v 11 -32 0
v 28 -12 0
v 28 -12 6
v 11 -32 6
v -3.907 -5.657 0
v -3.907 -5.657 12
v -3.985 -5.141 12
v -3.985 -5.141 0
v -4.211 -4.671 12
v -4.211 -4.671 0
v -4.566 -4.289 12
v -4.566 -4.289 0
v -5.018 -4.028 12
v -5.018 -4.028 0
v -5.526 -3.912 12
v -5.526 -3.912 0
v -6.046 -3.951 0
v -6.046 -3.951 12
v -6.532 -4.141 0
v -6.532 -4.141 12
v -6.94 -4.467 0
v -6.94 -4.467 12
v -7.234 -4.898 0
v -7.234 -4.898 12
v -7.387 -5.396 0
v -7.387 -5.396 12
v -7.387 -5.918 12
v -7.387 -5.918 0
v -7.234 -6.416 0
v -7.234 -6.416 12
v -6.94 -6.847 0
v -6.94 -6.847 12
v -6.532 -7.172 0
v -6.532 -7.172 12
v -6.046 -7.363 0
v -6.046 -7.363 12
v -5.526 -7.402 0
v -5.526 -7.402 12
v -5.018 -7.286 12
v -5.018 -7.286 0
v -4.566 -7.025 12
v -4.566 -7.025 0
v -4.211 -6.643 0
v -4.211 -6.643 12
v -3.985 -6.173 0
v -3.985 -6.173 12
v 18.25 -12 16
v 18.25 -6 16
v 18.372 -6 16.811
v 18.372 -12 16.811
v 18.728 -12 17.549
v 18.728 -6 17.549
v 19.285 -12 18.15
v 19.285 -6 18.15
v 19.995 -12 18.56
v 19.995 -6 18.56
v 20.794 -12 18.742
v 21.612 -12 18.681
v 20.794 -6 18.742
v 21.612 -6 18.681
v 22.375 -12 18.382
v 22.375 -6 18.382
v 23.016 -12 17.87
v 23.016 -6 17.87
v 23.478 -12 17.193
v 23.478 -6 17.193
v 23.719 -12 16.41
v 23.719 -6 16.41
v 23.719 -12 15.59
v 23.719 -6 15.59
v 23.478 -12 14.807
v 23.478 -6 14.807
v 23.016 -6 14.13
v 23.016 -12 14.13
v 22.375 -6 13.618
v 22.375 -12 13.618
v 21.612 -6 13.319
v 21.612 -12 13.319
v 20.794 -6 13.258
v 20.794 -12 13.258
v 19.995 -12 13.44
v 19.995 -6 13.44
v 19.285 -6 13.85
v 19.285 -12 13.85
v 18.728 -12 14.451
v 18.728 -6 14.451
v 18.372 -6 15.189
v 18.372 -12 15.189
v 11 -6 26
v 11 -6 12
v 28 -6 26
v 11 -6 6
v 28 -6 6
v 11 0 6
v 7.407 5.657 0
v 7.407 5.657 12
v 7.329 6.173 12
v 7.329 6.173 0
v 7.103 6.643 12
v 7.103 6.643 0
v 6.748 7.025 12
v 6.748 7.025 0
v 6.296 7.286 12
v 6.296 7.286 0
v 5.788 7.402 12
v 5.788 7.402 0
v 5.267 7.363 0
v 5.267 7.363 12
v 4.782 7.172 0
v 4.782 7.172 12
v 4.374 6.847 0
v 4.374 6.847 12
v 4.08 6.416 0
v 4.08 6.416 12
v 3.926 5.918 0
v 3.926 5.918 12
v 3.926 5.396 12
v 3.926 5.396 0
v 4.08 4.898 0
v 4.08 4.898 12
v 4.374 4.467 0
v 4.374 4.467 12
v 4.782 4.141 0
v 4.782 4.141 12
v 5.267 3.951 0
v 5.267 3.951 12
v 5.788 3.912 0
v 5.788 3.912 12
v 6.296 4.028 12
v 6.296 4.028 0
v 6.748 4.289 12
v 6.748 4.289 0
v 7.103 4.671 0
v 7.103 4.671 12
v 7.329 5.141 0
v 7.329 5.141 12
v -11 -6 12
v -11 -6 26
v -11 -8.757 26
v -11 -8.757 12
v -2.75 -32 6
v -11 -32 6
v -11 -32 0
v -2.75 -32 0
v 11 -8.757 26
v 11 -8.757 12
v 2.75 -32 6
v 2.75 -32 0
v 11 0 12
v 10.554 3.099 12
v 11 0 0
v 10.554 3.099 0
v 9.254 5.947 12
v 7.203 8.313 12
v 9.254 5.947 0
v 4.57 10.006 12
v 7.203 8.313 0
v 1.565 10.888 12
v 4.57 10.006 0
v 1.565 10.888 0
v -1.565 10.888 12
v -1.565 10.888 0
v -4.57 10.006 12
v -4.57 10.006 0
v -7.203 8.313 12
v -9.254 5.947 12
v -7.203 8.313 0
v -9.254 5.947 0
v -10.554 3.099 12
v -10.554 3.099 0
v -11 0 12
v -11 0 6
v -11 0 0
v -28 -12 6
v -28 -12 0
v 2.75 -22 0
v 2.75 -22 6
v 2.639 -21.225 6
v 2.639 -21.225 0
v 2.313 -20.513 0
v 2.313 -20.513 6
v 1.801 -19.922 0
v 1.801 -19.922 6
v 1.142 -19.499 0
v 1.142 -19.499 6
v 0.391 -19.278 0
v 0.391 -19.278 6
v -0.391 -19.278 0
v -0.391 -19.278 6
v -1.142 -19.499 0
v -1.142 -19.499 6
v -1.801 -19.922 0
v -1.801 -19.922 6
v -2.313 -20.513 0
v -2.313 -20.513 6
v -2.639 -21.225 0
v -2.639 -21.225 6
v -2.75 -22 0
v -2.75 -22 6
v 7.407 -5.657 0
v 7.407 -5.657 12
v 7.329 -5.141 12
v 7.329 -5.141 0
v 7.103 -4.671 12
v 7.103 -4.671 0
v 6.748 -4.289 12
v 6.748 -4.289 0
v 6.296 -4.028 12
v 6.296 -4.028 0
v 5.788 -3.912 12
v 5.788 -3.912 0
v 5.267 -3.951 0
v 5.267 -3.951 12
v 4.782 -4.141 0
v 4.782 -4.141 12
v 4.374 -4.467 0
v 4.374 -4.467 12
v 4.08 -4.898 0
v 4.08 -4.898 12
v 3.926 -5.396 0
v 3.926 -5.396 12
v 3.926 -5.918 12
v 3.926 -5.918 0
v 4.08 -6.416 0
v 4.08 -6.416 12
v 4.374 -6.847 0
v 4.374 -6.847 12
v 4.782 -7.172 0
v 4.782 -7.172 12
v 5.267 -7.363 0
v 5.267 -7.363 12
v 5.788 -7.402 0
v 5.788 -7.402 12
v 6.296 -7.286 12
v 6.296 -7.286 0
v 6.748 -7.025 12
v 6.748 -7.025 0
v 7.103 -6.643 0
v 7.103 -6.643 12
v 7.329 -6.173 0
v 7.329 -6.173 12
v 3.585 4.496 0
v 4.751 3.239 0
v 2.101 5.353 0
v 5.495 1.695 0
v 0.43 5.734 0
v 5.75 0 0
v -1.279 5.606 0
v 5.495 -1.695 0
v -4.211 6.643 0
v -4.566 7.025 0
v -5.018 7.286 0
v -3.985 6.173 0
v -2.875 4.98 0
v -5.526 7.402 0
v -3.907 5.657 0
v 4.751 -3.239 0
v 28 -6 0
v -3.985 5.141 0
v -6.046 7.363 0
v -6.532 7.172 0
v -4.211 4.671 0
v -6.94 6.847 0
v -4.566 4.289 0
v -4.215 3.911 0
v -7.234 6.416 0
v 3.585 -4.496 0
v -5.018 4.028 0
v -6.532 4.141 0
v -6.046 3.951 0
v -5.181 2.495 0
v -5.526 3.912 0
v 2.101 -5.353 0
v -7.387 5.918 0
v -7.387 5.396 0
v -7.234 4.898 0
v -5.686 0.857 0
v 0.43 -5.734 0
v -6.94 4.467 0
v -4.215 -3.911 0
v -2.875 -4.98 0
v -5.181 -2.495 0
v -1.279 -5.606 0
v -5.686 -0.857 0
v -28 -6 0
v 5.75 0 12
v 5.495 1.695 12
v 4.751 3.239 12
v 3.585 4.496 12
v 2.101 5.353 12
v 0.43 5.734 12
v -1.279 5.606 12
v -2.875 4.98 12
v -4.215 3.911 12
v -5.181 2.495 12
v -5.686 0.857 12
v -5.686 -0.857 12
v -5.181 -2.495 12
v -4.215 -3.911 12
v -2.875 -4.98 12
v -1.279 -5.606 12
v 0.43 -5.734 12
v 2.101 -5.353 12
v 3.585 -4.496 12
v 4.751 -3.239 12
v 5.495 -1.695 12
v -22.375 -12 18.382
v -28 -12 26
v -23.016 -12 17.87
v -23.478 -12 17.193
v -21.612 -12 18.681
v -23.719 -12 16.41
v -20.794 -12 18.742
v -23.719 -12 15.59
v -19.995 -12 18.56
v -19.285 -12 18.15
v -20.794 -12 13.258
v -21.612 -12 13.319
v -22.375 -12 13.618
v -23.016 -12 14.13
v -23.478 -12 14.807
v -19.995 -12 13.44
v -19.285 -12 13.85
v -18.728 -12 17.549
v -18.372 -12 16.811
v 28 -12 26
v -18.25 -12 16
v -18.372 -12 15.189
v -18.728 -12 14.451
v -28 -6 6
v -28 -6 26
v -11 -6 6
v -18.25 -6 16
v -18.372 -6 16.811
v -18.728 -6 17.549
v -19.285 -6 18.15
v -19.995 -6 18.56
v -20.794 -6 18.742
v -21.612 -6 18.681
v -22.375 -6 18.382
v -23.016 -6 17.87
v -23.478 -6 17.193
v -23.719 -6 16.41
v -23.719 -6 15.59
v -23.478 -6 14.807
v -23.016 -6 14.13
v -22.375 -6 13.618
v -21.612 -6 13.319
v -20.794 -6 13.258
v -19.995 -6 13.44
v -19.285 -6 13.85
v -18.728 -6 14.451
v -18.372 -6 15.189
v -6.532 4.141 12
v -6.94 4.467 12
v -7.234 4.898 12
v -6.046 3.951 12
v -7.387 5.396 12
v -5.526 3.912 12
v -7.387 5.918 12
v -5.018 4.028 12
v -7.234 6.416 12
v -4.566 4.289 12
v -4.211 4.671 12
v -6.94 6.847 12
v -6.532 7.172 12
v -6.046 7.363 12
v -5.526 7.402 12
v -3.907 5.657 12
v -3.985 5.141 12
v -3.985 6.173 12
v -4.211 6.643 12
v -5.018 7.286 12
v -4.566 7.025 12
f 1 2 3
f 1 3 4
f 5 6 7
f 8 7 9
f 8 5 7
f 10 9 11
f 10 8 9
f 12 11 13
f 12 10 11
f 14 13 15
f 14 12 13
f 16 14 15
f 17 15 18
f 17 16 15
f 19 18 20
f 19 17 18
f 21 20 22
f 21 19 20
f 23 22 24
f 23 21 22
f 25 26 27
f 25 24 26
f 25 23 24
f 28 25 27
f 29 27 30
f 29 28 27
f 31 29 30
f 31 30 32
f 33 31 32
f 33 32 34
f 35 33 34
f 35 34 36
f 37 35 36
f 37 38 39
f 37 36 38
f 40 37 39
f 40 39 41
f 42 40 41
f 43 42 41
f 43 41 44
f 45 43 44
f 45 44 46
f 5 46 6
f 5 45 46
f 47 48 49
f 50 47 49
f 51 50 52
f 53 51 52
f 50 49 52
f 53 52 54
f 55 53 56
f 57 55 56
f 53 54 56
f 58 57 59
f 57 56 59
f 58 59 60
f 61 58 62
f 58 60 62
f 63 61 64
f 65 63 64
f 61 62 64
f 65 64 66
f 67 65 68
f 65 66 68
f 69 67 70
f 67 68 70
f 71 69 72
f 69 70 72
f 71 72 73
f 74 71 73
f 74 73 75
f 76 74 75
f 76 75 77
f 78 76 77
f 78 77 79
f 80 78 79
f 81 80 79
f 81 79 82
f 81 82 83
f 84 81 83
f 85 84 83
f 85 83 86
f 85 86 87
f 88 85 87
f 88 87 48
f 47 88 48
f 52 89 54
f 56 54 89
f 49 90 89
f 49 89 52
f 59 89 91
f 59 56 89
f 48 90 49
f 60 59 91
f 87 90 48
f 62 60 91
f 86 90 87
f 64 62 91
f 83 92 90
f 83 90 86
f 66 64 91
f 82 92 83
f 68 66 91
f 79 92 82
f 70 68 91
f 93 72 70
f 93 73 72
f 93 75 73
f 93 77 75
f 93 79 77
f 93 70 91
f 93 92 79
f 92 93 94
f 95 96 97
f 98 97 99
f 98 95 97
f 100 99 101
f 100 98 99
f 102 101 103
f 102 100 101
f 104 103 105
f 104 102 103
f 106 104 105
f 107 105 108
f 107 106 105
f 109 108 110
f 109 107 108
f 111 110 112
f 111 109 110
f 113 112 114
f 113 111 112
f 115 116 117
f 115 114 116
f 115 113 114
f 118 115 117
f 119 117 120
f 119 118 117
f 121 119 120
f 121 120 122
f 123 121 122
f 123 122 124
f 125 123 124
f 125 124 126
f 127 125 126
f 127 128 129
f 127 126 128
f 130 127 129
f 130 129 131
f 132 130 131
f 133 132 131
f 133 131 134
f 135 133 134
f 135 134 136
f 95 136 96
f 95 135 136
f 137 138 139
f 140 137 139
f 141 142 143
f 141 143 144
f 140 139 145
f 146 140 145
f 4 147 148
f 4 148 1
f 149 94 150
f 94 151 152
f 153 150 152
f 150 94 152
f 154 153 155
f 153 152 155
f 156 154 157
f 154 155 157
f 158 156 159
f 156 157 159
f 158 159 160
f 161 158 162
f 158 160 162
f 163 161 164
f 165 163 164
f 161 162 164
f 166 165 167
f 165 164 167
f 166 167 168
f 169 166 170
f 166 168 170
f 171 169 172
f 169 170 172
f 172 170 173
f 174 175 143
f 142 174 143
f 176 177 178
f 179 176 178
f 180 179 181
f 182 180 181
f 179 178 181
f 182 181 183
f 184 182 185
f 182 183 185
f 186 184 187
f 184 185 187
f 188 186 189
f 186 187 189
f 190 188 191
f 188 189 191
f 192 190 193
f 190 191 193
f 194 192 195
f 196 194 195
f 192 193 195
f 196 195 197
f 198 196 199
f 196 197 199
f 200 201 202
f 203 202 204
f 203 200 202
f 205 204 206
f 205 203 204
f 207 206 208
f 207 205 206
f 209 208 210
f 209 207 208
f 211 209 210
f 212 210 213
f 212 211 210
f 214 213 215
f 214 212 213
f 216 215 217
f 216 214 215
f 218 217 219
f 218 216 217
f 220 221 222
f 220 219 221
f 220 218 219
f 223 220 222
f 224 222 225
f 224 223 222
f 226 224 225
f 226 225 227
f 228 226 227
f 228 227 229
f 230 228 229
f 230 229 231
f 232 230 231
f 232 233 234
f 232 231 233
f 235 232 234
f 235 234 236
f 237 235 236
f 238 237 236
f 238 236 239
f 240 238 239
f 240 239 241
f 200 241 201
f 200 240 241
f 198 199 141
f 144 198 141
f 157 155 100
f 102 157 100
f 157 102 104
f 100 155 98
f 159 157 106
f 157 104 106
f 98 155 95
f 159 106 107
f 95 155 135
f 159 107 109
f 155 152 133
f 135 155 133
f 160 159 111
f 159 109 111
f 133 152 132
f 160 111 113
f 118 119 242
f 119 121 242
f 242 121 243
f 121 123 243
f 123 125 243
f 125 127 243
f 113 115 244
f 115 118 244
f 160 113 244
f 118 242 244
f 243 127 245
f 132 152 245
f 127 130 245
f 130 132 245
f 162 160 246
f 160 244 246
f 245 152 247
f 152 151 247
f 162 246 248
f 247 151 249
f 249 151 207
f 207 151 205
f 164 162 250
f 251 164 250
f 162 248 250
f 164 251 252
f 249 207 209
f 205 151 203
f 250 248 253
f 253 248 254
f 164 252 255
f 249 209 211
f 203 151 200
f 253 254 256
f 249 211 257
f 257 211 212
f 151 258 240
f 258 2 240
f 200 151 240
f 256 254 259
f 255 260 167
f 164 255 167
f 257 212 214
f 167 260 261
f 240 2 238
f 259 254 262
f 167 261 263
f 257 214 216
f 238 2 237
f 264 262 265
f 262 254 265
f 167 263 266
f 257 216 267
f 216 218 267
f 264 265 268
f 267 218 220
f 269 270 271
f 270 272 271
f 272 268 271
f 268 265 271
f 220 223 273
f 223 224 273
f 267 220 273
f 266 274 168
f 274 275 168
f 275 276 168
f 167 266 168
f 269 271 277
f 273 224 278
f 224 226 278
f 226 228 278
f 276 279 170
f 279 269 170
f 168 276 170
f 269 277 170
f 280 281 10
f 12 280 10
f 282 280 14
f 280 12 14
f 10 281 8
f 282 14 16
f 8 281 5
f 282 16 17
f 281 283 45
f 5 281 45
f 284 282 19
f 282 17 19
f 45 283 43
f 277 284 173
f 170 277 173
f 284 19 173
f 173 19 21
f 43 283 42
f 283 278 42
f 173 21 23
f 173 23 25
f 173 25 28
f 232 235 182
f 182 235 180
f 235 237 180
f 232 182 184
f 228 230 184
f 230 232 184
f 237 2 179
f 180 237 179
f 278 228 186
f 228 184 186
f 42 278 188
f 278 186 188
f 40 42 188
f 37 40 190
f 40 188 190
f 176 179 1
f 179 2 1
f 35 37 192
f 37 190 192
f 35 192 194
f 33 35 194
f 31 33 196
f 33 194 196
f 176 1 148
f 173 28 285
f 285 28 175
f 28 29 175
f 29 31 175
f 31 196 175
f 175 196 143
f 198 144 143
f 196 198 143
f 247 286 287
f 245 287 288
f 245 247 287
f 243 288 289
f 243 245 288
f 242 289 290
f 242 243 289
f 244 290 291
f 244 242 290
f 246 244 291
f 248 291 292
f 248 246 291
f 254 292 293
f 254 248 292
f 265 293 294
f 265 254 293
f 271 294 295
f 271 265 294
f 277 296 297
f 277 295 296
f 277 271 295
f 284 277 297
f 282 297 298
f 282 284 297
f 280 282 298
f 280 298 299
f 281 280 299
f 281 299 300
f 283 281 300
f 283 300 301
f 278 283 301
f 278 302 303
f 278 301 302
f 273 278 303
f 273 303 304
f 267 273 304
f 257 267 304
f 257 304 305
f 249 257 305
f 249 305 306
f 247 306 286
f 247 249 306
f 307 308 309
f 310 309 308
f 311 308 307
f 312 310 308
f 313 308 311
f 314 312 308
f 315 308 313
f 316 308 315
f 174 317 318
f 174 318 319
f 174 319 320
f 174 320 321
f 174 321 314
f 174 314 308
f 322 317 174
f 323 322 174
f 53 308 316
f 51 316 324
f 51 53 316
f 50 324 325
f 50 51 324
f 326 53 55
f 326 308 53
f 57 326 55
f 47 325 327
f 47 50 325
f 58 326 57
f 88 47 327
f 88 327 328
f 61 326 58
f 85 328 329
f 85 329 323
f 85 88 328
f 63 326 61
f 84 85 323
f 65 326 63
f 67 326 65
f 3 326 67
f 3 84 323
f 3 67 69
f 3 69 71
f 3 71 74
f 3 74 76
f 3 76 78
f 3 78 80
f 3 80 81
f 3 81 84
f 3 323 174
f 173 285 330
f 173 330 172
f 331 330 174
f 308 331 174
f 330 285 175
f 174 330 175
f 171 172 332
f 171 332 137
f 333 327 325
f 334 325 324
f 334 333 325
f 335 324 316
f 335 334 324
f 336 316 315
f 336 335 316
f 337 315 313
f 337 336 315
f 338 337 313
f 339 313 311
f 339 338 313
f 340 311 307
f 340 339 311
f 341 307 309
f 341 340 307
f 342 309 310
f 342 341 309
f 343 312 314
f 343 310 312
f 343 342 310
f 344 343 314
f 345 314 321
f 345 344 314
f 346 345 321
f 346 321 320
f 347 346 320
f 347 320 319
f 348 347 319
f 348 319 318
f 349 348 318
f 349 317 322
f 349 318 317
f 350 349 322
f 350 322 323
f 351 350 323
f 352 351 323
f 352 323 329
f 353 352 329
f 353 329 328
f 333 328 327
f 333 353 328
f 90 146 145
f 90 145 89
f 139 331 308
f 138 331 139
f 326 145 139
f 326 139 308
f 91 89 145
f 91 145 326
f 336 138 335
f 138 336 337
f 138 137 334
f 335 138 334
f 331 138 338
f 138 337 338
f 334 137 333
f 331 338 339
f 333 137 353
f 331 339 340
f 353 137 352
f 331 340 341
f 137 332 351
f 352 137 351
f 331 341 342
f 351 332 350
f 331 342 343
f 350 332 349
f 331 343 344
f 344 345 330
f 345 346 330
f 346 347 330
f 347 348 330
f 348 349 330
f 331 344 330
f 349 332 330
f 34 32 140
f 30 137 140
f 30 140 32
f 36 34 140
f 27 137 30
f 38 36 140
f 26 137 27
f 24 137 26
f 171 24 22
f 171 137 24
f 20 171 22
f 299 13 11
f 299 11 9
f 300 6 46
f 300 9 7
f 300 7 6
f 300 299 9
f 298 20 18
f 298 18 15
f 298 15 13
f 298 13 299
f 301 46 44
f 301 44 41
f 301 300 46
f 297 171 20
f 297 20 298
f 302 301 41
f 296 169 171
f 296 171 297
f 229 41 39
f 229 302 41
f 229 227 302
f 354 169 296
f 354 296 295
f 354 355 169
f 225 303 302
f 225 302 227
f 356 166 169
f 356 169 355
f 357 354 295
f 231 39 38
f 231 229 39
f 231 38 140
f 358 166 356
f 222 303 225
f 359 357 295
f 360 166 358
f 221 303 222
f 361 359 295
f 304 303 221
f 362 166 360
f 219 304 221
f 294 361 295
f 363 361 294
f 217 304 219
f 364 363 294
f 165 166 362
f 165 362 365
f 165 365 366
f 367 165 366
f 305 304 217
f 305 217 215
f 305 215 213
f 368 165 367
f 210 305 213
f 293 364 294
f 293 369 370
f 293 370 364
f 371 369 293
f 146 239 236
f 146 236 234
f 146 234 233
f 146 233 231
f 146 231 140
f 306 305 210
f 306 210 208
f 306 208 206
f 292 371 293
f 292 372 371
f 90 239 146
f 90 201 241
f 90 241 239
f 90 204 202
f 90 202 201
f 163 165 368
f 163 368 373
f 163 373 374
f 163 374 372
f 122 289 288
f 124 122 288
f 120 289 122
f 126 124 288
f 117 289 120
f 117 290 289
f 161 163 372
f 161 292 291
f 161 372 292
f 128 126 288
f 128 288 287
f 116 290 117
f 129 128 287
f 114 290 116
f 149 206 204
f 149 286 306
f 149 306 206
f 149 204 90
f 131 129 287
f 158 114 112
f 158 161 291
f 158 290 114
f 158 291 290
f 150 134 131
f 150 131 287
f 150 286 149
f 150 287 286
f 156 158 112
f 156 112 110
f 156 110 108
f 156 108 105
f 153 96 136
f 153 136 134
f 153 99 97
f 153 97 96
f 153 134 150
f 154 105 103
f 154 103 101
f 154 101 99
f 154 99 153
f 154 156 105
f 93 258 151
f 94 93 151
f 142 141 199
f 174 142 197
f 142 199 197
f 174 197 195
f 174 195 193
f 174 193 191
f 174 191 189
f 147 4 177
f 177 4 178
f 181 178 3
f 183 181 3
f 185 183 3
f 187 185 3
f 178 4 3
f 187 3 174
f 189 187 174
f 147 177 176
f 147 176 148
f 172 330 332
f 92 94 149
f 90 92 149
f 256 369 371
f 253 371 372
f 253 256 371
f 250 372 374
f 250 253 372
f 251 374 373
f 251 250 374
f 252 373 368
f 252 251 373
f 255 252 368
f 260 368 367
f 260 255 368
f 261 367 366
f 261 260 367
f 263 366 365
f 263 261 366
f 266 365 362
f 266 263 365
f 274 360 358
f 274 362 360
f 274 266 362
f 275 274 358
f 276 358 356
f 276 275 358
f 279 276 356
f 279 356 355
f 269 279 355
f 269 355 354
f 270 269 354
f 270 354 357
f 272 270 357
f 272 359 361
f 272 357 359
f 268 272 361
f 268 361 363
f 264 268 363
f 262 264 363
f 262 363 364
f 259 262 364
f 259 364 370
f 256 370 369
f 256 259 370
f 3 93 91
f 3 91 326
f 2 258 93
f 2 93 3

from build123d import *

# Parameters (mm, degrees)
SKETCH_R        = 5.75
SKETCH_R_2      = 1.75
PAD_DEPTH       = 26
SKETCH001_W     = 22
SKETCH001_H     = 6
PAD001_DEPTH    = 20
POCKET_DEPTH    = 6.001
PAD002_DEPTH    = 26
PAD002_FACE13_W = 20
PAD002_FACE13_H = 20
POCKET001_DEPTH = 144.217351
SKETCH004_R     = 2.75
POCKET002_DEPTH = 153.217351
POCKET003_DEPTH = 14
PAD003_DEPTH    = 6


with BuildPart() as part:
    # Sketch → Pad (new body)
    with BuildSketch(Plane.XY):
        with BuildLine():
            ThreePointArc((11, 0), (0, 11), (-11, 0))
            Line((-11, 0), (-11, -12))
            Line((11, -12), (-11, -12))
            Line((11, -12), (11, 0))
        make_face()
        Circle(SKETCH_R, mode=Mode.SUBTRACT)
        with Locations((-5.656854, 5.656854)):
            Circle(SKETCH_R_2, mode=Mode.SUBTRACT)
        with Locations((5.656854, -5.656854)):
            Circle(SKETCH_R_2, mode=Mode.SUBTRACT)
        with Locations((-5.656854, -5.656854)):
            Circle(SKETCH_R_2, mode=Mode.SUBTRACT)
        with Locations((5.656854, 5.656854)):
            Circle(SKETCH_R_2, mode=Mode.SUBTRACT)
    extrude(amount=PAD_DEPTH)

    # Sketch001 (on Face4 of Pad) → Pad001 (join)
    with BuildSketch(Plane.XZ.offset(12)):
        with Locations((0, 3)):
            Rectangle(SKETCH001_W, SKETCH001_H)
    extrude(amount=PAD001_DEPTH)

    # Sketch002 (on Face4 of Pad001) → Pocket (cut, through all)
    with BuildSketch(Plane.XY.offset(6)):
        with BuildLine():
            ThreePointArc((2.75, -22), (0, -19.25), (-2.75, -22))
            Line((-2.75, -22), (-2.75, -32))
            Line((-2.75, -32), (2.75, -32))
            Line((2.75, -22), (2.75, -32))
        make_face()
    extrude(amount=-POCKET_DEPTH, mode=Mode.SUBTRACT)

    # Sketch003 → Pad002 (join)
    with BuildSketch(Plane.XY):
        Polygon((11, -6), (28, -6), (28, -12), (11, -32), align=None)
    pad002 = extrude(amount=PAD002_DEPTH)

    # Pad002 Face13 → Pocket001 (cut, through all)
    with BuildSketch(Plane(origin=(11, -22, 16), x_dir=(0, 1, 0), z_dir=(-1, 0, 0))):
        Rectangle(PAD002_FACE13_W, PAD002_FACE13_H)
    pocket001 = extrude(amount=-POCKET001_DEPTH, mode=Mode.SUBTRACT)

    # Sketch004 (on Face6 of Pocket001) → Pocket002 (cut, through all)
    with BuildSketch(Plane(origin=(0, -6, 0), x_dir=(-1, 0, 0), z_dir=(0, 1, 0))):
        with Locations((-21, 16)):
            Circle(SKETCH004_R)
    pocket002 = extrude(amount=-POCKET002_DEPTH, mode=Mode.SUBTRACT)

    # Mirrored: Pad002, Pocket001, Pocket002 across Sketch003 V_Axis
    add(pad002.mirror(Plane(origin=(0, 0, 0), x_dir=(0, 0, 1), z_dir=(1, 0, 0))))
    add(pocket001.mirror(Plane(origin=(0, 0, 0), x_dir=(0, 0, 1), z_dir=(1, 0, 0))), mode=Mode.SUBTRACT)
    add(pocket002.mirror(Plane(origin=(0, 0, 0), x_dir=(0, 0, 1), z_dir=(1, 0, 0))), mode=Mode.SUBTRACT)

    # Sketch005 (on Face23 of Mirrored) → Pocket003 (cut)
    with BuildSketch(Plane.XY.offset(26)):
        with BuildLine():
            Line((-11, 0), (-11, -8.756854))
            Line((-11, -8.756854), (11, -8.756854))
            Line((11, -8.756854), (11, 0))
            ThreePointArc((11, 0), (0, 11), (-11, 0))
        make_face()
    extrude(amount=-POCKET003_DEPTH, mode=Mode.SUBTRACT)

    # Sketch006 (on Face2 of Pocket003) → Pad003 (join)
    with BuildSketch(Plane(origin=(0, 0, 0), x_dir=(1, 0, 0), z_dir=(0, 0, -1))):
        Polygon((-28, 6), (-11, 0), (-11, 6), align=None)
    pad003 = extrude(amount=-PAD003_DEPTH)

    # Mirrored001: Pad003 across Sketch006 V_Axis
    add(pad003.mirror(Plane(origin=(0, 0, 0), x_dir=(0, 0, -1), z_dir=(1, 0, 0))))


solid = part.part
